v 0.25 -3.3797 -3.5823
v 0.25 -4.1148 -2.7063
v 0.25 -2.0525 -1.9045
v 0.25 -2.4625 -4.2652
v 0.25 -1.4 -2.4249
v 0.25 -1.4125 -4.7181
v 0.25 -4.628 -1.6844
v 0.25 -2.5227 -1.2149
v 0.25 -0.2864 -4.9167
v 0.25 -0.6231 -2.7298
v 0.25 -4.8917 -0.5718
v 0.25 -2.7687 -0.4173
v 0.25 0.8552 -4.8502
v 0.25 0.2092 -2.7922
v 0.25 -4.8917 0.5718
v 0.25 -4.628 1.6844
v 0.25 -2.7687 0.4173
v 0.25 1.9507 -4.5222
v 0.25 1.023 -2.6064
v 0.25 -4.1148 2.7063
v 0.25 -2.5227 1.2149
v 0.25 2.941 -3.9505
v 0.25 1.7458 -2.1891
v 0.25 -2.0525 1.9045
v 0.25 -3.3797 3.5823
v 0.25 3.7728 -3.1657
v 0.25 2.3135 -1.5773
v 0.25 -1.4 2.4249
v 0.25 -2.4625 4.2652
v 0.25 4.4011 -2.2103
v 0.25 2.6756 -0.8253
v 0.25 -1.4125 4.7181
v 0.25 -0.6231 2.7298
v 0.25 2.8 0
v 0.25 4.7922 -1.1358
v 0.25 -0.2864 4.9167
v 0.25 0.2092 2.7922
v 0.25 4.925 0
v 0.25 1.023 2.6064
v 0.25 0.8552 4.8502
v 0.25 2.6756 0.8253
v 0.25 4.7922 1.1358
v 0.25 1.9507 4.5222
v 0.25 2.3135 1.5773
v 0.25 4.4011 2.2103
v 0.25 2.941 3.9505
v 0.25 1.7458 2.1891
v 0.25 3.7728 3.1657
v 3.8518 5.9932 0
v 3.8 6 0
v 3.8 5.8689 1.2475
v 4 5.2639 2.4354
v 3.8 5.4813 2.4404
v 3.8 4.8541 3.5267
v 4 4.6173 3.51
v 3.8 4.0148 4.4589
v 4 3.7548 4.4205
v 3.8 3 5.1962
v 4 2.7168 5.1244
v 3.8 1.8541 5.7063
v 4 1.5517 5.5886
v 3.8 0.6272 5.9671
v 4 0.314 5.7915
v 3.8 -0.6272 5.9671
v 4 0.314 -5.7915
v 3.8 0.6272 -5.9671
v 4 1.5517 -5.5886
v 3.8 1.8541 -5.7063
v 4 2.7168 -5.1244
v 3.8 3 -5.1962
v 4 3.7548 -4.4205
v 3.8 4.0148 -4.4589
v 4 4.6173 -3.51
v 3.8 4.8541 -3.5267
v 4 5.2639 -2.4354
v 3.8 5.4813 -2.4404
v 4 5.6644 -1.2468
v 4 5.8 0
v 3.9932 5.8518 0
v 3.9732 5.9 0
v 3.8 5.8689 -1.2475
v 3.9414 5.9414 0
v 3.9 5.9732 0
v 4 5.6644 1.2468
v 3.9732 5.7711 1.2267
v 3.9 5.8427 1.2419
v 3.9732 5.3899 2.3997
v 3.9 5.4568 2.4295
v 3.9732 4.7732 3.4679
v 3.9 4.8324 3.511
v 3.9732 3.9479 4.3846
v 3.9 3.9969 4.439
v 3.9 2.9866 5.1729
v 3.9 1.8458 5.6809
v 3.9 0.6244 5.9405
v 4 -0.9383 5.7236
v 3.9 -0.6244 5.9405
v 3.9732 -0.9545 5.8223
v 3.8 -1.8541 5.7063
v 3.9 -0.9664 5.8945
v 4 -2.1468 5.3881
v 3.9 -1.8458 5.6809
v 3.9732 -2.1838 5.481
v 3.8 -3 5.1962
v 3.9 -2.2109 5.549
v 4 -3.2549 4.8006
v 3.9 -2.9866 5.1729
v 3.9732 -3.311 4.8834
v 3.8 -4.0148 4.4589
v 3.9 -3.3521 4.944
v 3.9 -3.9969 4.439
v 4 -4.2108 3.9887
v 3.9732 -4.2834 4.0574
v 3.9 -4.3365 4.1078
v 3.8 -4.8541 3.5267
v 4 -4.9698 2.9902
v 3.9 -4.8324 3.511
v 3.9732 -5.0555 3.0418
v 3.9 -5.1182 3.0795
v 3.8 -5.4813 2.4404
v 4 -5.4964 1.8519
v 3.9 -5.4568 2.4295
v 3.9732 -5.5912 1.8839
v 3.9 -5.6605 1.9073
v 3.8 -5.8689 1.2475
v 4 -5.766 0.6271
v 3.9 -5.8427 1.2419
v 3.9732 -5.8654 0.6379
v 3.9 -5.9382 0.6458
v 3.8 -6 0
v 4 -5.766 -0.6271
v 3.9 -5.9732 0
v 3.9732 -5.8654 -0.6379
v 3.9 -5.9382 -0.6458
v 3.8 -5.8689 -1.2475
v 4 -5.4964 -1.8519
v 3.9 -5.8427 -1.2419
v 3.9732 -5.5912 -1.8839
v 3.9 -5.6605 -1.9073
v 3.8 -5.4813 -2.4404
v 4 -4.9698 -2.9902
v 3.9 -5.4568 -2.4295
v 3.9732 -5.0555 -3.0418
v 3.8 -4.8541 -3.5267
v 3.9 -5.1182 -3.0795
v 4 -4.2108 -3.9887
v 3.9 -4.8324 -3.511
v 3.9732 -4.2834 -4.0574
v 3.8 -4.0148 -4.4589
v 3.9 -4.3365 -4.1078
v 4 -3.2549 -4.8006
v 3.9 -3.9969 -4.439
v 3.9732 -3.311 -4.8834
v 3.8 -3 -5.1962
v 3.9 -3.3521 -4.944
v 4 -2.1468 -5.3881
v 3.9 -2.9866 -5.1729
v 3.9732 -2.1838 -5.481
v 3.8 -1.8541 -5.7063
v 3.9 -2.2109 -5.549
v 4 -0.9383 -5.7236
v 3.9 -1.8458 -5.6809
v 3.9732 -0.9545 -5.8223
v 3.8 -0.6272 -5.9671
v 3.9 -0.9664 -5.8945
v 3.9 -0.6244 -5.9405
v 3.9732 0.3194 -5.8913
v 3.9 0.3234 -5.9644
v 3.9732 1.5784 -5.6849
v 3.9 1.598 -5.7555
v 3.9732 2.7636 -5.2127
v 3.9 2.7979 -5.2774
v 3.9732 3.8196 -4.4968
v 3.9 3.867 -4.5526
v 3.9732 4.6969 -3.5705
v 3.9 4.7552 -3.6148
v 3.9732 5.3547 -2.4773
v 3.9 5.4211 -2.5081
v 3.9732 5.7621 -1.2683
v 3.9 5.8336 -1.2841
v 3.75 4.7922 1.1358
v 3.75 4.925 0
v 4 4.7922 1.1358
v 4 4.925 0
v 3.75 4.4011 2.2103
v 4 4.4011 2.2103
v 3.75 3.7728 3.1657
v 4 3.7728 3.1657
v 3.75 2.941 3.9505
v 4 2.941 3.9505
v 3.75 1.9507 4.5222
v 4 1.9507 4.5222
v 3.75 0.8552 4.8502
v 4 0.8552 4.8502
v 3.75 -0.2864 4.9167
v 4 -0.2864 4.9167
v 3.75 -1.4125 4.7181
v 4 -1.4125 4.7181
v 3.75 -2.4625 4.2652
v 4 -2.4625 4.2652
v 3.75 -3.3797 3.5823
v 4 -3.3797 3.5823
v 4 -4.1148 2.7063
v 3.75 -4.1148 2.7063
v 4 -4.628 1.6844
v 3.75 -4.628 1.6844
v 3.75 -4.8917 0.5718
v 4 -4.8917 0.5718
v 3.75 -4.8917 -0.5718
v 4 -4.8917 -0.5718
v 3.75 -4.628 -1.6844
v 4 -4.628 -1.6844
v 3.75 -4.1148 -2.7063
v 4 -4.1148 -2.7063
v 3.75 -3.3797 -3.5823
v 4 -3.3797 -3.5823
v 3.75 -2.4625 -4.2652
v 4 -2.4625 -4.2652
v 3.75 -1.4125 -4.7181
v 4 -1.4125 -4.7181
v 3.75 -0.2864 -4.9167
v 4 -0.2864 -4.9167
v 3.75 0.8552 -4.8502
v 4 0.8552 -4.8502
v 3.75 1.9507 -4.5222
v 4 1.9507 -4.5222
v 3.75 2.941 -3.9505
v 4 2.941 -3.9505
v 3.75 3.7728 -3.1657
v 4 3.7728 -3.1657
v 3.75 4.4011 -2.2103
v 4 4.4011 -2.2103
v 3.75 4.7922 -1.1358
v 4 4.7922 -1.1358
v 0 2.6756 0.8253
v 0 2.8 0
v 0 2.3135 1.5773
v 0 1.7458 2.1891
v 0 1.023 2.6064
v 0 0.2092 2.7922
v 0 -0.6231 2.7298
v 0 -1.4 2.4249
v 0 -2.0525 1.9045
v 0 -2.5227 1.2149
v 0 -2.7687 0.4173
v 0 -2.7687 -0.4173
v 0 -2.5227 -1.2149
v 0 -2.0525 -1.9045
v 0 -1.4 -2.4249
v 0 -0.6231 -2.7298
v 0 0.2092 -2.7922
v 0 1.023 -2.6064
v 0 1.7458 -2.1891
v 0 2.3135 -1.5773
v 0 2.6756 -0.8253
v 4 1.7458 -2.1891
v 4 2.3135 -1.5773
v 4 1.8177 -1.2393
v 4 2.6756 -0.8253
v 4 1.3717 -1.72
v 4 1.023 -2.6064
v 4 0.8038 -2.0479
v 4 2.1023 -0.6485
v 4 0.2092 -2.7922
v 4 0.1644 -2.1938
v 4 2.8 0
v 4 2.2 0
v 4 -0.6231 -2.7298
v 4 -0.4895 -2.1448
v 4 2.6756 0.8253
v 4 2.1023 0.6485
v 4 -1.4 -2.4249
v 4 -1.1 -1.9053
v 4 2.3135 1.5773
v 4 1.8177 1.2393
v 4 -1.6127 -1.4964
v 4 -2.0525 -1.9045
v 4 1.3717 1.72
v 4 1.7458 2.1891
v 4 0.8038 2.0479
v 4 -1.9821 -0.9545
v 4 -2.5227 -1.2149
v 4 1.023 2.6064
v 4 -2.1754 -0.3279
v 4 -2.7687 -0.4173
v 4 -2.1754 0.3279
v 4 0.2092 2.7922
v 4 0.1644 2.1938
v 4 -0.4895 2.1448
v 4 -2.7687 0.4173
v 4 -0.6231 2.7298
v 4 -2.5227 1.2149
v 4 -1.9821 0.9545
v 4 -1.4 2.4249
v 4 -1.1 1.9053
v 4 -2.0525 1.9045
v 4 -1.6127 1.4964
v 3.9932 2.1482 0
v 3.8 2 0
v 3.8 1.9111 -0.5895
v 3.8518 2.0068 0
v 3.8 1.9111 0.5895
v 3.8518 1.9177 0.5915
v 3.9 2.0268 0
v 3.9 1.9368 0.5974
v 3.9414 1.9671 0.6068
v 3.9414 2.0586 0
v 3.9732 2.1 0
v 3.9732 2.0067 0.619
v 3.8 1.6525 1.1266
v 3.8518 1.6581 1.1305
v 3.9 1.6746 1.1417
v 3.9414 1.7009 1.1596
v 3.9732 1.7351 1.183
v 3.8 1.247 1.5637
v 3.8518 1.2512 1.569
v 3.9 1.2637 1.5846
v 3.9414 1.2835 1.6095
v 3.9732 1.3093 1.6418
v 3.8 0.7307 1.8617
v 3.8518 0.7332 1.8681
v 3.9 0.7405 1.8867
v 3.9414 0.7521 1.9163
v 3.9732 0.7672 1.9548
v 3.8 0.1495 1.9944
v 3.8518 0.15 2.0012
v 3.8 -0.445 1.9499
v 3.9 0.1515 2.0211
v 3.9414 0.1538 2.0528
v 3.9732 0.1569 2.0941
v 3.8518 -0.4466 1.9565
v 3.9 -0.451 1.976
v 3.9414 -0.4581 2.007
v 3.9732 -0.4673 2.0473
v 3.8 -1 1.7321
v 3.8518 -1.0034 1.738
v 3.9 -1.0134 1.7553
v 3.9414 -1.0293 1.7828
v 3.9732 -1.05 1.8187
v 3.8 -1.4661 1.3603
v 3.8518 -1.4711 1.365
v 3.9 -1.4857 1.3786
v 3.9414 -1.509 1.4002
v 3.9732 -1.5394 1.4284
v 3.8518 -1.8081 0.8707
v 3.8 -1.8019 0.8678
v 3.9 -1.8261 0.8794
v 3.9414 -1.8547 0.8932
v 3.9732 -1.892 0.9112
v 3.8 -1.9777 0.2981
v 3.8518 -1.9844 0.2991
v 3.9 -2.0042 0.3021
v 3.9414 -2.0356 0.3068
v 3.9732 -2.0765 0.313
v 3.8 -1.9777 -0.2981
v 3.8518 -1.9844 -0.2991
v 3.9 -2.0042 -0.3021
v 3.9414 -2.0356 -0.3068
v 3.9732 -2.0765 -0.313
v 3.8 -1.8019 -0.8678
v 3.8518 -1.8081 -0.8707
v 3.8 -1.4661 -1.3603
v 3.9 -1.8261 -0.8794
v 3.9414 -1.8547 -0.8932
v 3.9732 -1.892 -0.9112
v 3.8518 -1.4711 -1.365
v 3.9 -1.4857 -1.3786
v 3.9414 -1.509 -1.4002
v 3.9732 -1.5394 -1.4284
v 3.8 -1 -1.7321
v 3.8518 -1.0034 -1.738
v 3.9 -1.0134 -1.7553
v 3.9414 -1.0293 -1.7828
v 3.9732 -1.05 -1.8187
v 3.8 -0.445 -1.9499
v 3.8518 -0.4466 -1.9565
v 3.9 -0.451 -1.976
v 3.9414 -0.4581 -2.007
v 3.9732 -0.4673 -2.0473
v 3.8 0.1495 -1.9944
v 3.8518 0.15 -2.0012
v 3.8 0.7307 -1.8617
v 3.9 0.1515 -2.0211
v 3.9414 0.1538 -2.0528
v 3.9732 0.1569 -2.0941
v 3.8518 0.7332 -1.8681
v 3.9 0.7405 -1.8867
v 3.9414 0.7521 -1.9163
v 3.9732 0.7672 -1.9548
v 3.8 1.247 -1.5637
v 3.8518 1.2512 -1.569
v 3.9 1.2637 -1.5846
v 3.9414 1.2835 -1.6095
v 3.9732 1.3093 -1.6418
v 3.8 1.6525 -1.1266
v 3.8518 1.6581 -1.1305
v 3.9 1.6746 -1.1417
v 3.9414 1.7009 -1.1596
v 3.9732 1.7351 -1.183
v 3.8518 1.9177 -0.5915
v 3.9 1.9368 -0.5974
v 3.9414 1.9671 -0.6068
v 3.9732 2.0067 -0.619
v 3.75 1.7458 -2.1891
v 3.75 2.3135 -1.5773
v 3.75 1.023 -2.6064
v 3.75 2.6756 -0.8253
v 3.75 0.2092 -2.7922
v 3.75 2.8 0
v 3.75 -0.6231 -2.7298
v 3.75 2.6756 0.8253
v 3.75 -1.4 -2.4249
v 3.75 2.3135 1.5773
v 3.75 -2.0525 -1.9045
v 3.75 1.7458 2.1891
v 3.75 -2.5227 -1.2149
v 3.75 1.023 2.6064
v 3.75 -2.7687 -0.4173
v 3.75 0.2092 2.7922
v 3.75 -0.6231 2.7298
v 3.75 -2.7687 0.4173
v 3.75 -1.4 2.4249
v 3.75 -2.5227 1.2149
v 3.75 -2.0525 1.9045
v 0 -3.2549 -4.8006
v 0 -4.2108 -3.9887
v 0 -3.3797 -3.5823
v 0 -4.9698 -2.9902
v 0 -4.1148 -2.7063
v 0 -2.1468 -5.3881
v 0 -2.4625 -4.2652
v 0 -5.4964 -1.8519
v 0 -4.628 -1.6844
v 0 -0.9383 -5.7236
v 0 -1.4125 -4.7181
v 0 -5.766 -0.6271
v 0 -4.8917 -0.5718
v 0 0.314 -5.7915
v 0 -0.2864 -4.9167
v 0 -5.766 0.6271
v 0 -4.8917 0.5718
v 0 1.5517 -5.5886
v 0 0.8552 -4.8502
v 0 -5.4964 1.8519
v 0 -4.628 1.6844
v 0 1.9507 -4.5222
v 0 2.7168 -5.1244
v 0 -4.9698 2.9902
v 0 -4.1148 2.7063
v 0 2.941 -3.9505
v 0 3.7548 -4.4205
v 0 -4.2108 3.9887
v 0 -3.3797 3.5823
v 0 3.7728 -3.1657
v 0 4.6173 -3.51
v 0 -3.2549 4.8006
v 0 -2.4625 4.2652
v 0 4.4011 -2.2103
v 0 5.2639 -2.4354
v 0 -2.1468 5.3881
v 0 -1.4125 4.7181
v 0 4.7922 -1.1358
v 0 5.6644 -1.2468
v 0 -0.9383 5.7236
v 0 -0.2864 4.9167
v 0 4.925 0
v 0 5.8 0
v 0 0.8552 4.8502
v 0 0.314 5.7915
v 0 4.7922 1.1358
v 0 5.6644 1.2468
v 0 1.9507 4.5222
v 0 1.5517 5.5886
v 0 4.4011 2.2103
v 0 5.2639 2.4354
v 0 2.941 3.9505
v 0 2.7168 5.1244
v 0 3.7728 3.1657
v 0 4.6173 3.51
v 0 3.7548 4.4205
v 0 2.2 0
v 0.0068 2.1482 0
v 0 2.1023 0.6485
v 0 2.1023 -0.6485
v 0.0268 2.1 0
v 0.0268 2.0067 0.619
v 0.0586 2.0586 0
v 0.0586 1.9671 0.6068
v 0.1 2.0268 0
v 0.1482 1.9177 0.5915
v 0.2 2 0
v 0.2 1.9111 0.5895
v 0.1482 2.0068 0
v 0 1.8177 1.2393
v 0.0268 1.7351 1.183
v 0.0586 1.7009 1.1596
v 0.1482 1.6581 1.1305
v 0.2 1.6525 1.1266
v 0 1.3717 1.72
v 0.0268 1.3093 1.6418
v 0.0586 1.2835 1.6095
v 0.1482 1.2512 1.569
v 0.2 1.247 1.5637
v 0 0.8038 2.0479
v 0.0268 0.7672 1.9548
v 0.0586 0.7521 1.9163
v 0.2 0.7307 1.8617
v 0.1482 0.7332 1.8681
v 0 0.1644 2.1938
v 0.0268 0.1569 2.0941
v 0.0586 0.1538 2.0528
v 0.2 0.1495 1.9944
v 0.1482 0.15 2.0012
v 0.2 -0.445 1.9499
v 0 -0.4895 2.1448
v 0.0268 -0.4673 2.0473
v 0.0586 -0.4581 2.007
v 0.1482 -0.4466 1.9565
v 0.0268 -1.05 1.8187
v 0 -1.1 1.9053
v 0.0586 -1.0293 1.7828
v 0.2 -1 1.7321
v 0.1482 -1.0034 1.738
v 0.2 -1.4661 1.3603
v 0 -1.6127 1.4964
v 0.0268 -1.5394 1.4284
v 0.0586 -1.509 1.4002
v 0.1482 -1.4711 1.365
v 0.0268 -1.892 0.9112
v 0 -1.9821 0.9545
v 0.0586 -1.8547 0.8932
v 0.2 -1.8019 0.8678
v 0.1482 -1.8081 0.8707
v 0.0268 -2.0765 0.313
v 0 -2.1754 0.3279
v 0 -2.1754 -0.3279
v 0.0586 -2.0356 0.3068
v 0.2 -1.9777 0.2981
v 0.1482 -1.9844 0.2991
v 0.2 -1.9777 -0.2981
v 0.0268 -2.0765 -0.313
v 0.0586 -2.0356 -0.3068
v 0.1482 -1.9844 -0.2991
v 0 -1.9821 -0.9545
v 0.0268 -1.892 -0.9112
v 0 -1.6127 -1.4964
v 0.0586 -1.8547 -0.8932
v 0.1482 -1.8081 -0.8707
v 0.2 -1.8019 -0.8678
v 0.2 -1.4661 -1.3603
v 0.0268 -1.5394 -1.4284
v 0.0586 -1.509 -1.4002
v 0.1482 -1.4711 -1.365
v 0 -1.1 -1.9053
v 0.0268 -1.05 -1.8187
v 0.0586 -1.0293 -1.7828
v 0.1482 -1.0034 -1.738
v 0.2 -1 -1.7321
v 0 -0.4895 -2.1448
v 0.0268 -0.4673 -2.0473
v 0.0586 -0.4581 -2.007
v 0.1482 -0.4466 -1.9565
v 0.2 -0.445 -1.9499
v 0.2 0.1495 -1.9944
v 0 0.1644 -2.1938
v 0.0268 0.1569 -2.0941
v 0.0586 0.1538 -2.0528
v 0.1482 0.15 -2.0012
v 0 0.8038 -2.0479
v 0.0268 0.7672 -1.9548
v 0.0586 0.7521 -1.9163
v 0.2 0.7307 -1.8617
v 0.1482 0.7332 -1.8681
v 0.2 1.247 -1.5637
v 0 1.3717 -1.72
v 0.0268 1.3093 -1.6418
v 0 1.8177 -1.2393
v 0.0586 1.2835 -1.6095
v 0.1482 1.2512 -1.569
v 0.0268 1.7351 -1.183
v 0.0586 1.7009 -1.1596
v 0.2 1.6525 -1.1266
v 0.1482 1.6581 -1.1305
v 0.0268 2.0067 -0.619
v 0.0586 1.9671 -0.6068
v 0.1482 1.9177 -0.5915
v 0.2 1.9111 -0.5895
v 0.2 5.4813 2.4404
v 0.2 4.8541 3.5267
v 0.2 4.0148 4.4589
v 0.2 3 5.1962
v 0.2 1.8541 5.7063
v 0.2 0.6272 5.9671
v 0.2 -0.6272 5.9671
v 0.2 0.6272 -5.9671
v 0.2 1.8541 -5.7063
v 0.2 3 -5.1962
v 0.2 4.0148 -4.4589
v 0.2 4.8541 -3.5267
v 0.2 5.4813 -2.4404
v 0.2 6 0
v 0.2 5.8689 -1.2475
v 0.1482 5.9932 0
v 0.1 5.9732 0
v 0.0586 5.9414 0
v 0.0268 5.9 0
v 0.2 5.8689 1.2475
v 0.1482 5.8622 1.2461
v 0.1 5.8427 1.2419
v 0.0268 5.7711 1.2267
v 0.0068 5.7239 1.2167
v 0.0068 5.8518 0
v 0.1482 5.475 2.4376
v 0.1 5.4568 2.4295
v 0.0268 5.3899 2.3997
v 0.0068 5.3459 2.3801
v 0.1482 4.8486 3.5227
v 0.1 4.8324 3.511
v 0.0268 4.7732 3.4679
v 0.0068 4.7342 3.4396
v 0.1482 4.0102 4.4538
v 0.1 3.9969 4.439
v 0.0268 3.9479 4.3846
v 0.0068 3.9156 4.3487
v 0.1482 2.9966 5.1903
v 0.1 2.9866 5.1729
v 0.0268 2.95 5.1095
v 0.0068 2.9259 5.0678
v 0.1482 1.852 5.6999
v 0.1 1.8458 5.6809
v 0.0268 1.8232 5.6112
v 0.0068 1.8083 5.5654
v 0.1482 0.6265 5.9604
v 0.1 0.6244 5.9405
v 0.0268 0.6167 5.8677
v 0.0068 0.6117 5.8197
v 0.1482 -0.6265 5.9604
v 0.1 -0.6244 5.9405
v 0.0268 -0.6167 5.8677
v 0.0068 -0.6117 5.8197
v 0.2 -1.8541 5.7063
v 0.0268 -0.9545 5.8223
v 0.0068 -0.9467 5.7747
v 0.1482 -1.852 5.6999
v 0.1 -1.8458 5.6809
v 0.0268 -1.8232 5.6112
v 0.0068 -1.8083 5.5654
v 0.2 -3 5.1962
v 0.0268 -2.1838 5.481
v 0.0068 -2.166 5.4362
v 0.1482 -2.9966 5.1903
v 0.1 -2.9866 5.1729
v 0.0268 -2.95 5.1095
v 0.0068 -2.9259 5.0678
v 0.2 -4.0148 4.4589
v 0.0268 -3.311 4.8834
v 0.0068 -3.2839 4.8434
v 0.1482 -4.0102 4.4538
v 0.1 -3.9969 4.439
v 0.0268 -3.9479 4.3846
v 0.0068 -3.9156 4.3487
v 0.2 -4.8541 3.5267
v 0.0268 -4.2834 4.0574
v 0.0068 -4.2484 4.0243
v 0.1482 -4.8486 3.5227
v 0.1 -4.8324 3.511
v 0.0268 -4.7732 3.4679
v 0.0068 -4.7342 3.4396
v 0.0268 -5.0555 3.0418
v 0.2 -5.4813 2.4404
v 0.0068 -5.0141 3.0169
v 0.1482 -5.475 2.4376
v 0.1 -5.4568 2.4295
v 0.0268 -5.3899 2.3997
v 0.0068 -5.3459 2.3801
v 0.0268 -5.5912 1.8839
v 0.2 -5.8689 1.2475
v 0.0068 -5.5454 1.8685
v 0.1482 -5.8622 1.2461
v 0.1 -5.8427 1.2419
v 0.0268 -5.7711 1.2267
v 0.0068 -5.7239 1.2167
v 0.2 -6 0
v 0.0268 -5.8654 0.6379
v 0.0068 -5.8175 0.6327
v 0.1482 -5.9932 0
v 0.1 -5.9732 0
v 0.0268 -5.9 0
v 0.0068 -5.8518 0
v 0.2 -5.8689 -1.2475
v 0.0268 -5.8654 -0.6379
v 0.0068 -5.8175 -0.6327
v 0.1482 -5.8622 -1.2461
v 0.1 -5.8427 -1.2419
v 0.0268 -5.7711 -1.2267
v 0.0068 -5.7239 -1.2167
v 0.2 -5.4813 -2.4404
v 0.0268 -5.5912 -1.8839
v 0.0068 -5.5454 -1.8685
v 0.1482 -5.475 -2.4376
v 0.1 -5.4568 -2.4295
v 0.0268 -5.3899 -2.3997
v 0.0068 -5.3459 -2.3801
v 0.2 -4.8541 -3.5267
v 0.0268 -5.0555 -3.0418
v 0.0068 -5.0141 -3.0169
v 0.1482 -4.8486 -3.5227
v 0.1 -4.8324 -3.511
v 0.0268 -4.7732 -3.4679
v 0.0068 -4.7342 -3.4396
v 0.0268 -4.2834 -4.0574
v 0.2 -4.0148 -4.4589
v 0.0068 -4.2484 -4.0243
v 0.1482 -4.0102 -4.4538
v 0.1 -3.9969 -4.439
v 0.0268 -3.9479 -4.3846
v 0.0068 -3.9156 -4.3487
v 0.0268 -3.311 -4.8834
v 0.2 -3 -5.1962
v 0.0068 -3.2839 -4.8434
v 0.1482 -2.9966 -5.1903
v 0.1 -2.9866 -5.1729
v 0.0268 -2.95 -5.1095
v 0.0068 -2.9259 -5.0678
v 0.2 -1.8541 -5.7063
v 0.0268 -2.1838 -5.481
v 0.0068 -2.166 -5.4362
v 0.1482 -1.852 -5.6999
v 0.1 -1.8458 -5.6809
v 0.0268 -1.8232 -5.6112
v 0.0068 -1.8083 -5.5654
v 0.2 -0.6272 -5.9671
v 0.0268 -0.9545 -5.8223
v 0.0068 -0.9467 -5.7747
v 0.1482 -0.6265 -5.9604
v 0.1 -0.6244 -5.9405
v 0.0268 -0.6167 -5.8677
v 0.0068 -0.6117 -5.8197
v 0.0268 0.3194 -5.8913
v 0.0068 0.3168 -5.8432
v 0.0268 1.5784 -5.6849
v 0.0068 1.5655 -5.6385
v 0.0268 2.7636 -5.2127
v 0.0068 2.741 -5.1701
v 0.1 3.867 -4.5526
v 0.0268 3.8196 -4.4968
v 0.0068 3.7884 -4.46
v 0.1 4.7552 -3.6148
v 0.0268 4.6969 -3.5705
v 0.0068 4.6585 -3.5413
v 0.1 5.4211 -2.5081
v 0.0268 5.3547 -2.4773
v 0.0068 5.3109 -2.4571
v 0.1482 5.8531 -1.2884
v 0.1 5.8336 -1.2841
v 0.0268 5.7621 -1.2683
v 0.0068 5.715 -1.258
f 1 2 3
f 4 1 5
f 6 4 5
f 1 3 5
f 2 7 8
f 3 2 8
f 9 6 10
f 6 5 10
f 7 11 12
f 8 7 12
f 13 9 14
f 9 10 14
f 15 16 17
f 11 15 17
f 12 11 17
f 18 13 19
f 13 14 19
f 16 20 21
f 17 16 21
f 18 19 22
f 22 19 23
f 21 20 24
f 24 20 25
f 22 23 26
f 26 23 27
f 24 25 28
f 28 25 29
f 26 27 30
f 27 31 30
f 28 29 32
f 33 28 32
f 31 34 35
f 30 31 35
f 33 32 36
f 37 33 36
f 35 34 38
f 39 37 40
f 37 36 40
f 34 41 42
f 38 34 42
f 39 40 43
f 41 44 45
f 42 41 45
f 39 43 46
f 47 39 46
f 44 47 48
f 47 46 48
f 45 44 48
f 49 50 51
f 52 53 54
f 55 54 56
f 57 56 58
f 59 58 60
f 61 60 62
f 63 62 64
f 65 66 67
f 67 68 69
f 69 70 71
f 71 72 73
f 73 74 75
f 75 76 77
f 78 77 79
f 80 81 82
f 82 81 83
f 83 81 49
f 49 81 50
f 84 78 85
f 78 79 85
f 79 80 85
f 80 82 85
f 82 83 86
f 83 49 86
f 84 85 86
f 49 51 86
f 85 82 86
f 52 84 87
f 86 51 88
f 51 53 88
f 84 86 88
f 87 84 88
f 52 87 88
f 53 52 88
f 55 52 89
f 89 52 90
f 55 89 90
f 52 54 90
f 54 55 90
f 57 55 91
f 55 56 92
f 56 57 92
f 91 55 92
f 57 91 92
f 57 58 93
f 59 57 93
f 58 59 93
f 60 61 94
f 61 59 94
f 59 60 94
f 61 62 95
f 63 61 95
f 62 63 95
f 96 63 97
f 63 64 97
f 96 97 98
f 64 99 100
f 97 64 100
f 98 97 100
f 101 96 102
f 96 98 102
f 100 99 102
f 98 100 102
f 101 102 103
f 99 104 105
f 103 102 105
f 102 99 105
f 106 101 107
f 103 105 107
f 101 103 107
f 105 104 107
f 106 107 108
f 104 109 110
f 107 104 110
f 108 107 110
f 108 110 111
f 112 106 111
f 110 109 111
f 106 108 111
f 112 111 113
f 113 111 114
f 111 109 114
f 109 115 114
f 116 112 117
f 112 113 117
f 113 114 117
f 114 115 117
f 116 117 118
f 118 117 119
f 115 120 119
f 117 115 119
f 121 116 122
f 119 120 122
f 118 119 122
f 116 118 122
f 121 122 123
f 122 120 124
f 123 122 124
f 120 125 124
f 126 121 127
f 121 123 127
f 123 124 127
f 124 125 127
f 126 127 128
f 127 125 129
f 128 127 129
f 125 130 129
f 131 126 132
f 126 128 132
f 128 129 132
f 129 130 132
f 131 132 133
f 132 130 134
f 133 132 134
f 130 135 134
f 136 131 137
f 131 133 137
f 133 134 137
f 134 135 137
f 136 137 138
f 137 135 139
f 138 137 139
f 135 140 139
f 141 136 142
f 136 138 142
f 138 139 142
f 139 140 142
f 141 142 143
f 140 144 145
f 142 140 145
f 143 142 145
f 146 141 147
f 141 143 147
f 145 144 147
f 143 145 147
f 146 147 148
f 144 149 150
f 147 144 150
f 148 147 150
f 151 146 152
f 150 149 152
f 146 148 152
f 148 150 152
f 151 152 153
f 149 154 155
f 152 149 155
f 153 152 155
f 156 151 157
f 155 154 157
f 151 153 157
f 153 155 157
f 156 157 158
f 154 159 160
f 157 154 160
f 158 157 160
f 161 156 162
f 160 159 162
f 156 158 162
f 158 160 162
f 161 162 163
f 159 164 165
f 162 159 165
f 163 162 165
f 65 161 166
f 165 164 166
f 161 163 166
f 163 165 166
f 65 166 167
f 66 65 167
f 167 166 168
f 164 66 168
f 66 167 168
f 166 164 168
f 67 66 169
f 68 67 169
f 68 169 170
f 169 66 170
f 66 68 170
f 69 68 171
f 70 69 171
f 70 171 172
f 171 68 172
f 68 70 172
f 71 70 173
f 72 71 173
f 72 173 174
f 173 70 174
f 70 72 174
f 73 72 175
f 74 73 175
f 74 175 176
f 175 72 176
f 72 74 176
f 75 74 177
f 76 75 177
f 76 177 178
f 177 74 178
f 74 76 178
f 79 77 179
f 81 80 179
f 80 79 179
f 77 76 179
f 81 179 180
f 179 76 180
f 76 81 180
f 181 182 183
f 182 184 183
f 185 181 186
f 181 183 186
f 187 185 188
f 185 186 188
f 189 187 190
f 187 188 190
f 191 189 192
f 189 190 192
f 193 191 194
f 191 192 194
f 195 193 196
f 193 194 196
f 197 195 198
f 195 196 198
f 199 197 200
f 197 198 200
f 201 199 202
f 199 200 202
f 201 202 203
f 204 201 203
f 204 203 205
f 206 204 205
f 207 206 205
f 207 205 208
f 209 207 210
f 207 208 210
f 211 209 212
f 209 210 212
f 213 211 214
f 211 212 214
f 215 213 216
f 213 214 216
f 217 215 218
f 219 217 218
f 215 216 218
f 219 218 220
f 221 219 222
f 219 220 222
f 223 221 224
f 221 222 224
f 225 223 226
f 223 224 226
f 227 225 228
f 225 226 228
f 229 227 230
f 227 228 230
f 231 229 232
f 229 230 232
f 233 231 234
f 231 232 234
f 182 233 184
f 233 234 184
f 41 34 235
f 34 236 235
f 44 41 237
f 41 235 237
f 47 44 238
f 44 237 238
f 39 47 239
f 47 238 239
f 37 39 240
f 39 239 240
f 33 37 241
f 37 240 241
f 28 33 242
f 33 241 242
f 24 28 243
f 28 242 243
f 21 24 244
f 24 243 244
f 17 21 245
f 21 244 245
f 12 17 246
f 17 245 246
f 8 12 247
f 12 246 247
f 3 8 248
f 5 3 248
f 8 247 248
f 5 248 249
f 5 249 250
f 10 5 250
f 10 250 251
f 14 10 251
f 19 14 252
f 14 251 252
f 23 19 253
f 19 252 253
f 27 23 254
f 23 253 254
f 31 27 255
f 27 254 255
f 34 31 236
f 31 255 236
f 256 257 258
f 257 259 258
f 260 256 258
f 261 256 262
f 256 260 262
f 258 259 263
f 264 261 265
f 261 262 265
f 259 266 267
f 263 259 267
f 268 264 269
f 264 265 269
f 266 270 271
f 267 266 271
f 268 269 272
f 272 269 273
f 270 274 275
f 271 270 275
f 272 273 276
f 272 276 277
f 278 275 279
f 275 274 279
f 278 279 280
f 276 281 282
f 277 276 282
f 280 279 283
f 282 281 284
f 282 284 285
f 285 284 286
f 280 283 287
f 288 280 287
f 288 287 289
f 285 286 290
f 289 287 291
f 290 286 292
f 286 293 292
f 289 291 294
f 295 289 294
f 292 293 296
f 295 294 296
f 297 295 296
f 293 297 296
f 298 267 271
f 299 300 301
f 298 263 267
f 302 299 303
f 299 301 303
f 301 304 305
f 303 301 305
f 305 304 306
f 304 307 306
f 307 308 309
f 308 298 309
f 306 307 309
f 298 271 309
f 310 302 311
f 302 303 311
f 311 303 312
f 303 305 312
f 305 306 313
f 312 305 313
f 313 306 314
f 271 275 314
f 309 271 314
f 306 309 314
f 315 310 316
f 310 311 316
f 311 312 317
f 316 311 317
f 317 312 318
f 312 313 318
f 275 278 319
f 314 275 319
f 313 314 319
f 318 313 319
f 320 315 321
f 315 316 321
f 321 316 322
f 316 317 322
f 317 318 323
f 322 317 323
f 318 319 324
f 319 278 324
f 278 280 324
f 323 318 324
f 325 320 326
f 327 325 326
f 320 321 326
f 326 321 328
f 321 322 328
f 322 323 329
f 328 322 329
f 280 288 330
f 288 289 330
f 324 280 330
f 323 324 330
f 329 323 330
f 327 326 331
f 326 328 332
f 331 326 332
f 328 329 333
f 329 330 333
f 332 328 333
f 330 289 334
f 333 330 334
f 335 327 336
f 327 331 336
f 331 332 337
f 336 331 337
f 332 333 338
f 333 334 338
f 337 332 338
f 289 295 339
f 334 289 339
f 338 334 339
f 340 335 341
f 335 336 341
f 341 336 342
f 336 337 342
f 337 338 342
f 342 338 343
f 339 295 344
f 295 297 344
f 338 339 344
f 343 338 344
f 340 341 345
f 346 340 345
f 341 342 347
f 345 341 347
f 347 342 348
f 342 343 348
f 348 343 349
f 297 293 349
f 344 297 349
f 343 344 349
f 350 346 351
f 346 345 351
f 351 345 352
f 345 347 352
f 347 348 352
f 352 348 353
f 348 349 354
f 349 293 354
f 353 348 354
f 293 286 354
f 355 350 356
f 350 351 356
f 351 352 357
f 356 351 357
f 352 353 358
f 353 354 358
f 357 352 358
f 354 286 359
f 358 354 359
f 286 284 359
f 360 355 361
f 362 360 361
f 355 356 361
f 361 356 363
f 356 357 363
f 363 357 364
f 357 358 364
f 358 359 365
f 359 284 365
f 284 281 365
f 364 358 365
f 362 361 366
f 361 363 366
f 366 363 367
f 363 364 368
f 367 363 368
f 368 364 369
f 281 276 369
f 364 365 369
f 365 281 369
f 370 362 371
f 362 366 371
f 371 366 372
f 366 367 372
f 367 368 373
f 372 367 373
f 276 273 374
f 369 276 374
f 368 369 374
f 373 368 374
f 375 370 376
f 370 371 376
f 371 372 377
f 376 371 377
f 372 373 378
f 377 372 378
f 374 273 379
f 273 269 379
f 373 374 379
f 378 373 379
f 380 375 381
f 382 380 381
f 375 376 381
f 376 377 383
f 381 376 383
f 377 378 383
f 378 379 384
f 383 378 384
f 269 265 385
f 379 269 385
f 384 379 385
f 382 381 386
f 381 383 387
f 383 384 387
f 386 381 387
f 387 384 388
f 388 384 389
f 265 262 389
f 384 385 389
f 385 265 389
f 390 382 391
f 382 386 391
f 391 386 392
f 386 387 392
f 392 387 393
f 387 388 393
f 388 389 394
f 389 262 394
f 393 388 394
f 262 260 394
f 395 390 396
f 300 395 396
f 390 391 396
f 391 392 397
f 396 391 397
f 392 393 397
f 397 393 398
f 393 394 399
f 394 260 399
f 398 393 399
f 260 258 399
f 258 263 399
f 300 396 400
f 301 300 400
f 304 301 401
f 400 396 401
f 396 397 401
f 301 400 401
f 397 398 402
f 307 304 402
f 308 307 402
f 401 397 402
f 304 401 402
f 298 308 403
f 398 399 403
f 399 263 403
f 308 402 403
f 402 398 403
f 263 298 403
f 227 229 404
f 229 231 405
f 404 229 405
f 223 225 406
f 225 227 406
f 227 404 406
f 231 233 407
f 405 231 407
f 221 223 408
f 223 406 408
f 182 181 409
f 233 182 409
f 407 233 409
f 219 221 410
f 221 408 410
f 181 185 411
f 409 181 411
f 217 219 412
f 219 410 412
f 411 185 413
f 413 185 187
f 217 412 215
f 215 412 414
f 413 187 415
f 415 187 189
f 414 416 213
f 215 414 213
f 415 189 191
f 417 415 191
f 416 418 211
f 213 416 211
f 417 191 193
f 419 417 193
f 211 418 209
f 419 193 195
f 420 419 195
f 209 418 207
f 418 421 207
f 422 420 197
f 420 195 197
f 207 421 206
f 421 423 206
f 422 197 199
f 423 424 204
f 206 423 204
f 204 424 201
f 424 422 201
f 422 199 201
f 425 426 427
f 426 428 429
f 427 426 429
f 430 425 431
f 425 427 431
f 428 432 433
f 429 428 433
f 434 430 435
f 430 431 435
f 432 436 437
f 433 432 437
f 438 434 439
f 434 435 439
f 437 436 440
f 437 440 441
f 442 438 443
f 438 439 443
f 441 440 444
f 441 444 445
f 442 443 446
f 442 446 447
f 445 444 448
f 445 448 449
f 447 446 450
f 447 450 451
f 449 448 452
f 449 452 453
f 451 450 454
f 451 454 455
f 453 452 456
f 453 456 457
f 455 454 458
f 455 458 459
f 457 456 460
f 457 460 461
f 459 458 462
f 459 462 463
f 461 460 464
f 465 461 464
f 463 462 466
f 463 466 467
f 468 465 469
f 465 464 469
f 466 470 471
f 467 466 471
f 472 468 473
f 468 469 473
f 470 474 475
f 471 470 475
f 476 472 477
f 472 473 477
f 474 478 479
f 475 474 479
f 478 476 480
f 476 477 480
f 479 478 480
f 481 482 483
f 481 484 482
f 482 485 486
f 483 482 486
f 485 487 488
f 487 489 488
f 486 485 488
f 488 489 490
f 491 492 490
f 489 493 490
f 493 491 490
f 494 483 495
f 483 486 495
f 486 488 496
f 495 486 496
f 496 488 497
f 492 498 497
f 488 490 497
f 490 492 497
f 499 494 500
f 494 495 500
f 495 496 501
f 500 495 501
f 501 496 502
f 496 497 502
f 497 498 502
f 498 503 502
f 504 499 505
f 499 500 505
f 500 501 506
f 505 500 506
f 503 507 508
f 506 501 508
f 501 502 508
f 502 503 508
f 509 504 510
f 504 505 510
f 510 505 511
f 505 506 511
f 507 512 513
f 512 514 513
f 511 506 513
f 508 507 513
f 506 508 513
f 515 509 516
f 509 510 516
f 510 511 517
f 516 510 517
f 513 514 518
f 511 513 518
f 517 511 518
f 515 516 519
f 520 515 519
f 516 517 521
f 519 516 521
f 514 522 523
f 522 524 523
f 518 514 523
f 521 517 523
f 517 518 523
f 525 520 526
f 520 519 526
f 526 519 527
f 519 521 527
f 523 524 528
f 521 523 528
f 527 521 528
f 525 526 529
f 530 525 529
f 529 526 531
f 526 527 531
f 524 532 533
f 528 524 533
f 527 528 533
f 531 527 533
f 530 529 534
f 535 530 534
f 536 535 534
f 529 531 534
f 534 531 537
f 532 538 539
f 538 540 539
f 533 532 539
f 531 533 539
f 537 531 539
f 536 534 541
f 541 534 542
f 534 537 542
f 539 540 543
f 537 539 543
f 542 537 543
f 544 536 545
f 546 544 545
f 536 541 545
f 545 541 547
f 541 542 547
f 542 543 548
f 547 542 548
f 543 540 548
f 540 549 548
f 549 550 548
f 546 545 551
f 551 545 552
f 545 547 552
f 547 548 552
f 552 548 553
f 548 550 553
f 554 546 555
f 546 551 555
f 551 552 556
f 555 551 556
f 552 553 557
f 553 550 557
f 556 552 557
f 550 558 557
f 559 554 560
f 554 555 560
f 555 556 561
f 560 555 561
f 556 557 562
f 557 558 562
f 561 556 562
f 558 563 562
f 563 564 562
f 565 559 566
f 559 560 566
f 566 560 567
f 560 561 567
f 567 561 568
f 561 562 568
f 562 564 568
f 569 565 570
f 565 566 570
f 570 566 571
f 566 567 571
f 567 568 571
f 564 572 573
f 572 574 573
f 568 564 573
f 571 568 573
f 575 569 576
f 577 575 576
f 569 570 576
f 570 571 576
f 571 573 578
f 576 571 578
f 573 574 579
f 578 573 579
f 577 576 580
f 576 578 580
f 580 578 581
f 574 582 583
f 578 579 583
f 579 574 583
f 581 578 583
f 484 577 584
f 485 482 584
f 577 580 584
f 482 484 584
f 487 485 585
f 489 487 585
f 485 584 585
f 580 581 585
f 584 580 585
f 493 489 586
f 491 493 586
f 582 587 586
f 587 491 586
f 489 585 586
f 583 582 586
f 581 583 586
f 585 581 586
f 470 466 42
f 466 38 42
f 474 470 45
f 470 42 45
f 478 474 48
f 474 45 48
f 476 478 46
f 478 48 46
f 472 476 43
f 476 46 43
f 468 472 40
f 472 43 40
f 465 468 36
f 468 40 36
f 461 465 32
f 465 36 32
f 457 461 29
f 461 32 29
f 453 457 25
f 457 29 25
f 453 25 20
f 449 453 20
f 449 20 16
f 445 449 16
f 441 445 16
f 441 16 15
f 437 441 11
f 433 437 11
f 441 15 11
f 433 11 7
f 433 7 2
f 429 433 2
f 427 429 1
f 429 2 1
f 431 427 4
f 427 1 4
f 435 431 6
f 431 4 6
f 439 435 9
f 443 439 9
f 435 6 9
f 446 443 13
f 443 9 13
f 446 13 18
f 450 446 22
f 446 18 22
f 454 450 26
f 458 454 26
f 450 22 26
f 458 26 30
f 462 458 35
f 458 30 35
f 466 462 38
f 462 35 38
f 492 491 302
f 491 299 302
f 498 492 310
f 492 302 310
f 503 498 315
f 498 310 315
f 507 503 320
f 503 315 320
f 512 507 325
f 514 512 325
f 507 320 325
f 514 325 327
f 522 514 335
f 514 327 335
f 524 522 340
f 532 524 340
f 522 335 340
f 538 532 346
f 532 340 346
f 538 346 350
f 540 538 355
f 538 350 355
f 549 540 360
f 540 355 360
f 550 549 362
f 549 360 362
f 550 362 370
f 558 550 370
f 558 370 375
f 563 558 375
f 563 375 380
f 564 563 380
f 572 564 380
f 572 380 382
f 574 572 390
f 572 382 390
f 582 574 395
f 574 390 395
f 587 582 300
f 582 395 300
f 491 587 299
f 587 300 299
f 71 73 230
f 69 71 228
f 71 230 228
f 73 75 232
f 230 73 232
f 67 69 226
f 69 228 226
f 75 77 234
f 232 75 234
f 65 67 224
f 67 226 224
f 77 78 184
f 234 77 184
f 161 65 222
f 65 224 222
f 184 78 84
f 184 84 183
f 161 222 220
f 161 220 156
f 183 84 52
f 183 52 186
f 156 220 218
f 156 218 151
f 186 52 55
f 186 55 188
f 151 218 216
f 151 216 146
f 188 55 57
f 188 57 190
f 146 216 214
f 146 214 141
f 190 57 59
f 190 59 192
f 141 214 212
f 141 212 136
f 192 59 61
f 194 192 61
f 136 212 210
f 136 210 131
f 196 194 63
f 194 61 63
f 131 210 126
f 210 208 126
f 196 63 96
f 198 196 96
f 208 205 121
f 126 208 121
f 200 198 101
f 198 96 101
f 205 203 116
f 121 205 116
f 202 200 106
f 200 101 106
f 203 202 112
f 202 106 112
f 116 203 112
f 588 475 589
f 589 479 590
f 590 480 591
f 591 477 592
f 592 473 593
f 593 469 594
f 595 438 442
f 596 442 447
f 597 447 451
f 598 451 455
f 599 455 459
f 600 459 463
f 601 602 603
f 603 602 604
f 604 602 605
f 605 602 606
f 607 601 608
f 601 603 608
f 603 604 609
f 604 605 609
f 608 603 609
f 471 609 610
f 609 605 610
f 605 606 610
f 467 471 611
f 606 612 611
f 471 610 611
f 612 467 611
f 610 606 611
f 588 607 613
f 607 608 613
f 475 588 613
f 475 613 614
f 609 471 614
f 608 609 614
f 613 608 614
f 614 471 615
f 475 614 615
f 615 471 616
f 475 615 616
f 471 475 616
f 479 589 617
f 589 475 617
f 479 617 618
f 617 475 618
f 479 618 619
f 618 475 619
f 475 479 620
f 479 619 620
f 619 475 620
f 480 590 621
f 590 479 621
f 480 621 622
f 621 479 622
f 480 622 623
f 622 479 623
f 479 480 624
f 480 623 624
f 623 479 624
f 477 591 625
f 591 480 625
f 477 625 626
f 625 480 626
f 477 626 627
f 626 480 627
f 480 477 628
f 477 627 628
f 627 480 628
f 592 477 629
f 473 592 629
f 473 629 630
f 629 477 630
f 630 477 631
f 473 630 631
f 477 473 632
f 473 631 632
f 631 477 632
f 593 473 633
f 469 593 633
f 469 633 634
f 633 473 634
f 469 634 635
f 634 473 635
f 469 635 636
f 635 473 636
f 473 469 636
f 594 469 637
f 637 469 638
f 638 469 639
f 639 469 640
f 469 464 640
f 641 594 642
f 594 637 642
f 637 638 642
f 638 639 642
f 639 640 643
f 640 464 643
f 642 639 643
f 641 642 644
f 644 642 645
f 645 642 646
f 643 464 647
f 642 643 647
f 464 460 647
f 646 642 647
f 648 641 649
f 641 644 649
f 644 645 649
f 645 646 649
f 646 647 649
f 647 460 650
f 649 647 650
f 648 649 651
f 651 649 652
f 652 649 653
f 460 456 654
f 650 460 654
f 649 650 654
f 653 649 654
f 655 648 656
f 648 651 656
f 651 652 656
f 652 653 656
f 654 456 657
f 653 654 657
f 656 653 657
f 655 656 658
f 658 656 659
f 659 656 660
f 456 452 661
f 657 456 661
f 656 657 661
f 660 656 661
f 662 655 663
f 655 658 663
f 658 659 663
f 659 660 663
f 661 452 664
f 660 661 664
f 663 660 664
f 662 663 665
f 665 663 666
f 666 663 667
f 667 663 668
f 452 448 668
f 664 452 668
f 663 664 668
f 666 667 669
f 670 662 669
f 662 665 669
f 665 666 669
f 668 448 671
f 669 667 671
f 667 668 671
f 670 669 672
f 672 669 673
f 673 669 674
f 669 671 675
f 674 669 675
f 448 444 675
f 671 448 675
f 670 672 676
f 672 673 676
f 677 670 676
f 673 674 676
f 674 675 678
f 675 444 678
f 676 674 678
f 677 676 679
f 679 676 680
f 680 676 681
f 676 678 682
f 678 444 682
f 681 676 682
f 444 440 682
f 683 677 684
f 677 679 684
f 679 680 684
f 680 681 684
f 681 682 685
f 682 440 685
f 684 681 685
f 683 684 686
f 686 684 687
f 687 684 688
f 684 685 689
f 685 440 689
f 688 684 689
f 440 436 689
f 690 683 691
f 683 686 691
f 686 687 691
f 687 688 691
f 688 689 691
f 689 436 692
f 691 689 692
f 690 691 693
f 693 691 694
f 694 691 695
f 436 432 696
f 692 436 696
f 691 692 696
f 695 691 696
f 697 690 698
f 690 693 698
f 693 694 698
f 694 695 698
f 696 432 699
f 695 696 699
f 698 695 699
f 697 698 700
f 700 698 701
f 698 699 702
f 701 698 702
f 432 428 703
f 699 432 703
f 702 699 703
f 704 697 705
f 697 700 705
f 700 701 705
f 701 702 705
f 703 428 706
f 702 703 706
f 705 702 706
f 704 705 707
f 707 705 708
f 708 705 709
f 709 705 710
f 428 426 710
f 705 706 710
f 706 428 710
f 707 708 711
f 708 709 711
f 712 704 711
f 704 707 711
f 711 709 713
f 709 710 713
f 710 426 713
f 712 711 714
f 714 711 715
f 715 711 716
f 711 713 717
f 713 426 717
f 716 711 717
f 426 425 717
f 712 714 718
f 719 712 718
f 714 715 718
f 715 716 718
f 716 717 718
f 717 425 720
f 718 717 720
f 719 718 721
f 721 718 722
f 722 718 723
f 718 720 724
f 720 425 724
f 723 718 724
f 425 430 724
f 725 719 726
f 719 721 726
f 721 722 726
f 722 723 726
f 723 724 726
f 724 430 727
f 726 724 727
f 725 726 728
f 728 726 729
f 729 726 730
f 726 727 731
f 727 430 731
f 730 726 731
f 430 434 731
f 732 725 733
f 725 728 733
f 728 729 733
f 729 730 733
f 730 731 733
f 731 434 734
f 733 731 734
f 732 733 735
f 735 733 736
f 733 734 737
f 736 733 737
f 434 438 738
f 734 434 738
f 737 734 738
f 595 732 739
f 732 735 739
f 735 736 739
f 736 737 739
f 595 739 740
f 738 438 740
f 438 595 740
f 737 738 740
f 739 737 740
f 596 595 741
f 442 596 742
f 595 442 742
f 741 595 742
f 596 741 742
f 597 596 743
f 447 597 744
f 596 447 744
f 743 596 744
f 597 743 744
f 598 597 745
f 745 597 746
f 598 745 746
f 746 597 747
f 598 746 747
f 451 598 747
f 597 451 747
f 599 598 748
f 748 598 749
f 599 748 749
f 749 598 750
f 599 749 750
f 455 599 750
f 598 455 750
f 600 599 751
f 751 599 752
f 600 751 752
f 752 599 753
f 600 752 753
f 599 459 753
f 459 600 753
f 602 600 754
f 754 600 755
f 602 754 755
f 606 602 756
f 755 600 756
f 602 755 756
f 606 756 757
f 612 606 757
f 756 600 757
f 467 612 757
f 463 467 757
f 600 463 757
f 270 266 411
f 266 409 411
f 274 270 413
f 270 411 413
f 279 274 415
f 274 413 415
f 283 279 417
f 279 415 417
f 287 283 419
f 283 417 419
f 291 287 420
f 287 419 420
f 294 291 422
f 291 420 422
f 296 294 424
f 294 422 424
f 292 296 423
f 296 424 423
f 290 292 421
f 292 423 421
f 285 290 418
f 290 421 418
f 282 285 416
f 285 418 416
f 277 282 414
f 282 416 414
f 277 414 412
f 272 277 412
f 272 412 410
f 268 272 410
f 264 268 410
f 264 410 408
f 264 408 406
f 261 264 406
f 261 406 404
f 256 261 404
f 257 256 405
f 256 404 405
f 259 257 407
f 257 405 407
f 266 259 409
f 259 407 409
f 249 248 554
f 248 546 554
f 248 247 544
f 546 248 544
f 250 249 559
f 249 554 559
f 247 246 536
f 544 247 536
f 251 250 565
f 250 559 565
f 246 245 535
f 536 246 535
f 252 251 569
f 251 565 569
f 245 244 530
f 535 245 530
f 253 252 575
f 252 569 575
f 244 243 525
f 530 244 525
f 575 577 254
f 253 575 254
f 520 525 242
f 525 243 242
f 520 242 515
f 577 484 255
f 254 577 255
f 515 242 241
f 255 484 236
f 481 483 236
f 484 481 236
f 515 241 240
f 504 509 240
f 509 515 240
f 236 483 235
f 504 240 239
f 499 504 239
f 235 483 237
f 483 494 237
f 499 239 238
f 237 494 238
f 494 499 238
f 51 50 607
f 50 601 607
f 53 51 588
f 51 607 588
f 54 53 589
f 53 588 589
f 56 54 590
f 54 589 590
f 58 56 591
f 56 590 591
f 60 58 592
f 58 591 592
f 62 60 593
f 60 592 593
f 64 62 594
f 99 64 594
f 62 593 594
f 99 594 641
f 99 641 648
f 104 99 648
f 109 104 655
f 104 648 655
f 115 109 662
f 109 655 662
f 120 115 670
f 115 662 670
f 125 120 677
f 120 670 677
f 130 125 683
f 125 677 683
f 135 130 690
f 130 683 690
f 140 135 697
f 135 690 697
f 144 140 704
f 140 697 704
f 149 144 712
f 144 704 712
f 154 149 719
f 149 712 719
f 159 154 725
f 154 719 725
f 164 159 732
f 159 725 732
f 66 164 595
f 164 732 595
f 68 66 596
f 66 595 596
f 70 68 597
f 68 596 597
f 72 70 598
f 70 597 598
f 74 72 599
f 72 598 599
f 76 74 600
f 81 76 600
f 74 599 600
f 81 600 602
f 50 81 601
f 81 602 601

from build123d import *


with BuildPart() as part:
    # Sketch1 → Revolve1 (revolve)
    with BuildSketch(Plane.XY):
        with BuildLine():
            Line((0, 4.925), (0.25, 4.925))
            Line((0.25, 4.925), (0.25, 2.8))
            Line((0.25, 2.8), (0, 2.8))
            Line((0, 2.8), (0, 2.2))
            ThreePointArc((0, 2.2), (0.058578644, 2.058578644), (0.2, 2))
            Line((0.2, 2), (3.8, 2))
            ThreePointArc((3.8, 2), (3.941421356, 2.058578644), (4, 2.2))
            Line((4, 2.2), (4, 2.8))
            Line((4, 2.8), (3.75, 2.8))
            Line((3.75, 2.8), (3.75, 4.925))
            Line((3.75, 4.925), (4, 4.925))
            Line((4, 4.925), (4, 5.8))
            ThreePointArc((4, 5.8), (3.941421356, 5.941421356), (3.8, 6))
            Line((3.8, 6), (0.2, 6))
            ThreePointArc((0.2, 6), (0.058578644, 5.941421356), (0, 5.8))
            Line((0, 5.8), (0, 4.925))
        make_face()
    revolve(axis=Axis((-0.2, 0, 0), (1, 0, 0)))


solid = part.part
